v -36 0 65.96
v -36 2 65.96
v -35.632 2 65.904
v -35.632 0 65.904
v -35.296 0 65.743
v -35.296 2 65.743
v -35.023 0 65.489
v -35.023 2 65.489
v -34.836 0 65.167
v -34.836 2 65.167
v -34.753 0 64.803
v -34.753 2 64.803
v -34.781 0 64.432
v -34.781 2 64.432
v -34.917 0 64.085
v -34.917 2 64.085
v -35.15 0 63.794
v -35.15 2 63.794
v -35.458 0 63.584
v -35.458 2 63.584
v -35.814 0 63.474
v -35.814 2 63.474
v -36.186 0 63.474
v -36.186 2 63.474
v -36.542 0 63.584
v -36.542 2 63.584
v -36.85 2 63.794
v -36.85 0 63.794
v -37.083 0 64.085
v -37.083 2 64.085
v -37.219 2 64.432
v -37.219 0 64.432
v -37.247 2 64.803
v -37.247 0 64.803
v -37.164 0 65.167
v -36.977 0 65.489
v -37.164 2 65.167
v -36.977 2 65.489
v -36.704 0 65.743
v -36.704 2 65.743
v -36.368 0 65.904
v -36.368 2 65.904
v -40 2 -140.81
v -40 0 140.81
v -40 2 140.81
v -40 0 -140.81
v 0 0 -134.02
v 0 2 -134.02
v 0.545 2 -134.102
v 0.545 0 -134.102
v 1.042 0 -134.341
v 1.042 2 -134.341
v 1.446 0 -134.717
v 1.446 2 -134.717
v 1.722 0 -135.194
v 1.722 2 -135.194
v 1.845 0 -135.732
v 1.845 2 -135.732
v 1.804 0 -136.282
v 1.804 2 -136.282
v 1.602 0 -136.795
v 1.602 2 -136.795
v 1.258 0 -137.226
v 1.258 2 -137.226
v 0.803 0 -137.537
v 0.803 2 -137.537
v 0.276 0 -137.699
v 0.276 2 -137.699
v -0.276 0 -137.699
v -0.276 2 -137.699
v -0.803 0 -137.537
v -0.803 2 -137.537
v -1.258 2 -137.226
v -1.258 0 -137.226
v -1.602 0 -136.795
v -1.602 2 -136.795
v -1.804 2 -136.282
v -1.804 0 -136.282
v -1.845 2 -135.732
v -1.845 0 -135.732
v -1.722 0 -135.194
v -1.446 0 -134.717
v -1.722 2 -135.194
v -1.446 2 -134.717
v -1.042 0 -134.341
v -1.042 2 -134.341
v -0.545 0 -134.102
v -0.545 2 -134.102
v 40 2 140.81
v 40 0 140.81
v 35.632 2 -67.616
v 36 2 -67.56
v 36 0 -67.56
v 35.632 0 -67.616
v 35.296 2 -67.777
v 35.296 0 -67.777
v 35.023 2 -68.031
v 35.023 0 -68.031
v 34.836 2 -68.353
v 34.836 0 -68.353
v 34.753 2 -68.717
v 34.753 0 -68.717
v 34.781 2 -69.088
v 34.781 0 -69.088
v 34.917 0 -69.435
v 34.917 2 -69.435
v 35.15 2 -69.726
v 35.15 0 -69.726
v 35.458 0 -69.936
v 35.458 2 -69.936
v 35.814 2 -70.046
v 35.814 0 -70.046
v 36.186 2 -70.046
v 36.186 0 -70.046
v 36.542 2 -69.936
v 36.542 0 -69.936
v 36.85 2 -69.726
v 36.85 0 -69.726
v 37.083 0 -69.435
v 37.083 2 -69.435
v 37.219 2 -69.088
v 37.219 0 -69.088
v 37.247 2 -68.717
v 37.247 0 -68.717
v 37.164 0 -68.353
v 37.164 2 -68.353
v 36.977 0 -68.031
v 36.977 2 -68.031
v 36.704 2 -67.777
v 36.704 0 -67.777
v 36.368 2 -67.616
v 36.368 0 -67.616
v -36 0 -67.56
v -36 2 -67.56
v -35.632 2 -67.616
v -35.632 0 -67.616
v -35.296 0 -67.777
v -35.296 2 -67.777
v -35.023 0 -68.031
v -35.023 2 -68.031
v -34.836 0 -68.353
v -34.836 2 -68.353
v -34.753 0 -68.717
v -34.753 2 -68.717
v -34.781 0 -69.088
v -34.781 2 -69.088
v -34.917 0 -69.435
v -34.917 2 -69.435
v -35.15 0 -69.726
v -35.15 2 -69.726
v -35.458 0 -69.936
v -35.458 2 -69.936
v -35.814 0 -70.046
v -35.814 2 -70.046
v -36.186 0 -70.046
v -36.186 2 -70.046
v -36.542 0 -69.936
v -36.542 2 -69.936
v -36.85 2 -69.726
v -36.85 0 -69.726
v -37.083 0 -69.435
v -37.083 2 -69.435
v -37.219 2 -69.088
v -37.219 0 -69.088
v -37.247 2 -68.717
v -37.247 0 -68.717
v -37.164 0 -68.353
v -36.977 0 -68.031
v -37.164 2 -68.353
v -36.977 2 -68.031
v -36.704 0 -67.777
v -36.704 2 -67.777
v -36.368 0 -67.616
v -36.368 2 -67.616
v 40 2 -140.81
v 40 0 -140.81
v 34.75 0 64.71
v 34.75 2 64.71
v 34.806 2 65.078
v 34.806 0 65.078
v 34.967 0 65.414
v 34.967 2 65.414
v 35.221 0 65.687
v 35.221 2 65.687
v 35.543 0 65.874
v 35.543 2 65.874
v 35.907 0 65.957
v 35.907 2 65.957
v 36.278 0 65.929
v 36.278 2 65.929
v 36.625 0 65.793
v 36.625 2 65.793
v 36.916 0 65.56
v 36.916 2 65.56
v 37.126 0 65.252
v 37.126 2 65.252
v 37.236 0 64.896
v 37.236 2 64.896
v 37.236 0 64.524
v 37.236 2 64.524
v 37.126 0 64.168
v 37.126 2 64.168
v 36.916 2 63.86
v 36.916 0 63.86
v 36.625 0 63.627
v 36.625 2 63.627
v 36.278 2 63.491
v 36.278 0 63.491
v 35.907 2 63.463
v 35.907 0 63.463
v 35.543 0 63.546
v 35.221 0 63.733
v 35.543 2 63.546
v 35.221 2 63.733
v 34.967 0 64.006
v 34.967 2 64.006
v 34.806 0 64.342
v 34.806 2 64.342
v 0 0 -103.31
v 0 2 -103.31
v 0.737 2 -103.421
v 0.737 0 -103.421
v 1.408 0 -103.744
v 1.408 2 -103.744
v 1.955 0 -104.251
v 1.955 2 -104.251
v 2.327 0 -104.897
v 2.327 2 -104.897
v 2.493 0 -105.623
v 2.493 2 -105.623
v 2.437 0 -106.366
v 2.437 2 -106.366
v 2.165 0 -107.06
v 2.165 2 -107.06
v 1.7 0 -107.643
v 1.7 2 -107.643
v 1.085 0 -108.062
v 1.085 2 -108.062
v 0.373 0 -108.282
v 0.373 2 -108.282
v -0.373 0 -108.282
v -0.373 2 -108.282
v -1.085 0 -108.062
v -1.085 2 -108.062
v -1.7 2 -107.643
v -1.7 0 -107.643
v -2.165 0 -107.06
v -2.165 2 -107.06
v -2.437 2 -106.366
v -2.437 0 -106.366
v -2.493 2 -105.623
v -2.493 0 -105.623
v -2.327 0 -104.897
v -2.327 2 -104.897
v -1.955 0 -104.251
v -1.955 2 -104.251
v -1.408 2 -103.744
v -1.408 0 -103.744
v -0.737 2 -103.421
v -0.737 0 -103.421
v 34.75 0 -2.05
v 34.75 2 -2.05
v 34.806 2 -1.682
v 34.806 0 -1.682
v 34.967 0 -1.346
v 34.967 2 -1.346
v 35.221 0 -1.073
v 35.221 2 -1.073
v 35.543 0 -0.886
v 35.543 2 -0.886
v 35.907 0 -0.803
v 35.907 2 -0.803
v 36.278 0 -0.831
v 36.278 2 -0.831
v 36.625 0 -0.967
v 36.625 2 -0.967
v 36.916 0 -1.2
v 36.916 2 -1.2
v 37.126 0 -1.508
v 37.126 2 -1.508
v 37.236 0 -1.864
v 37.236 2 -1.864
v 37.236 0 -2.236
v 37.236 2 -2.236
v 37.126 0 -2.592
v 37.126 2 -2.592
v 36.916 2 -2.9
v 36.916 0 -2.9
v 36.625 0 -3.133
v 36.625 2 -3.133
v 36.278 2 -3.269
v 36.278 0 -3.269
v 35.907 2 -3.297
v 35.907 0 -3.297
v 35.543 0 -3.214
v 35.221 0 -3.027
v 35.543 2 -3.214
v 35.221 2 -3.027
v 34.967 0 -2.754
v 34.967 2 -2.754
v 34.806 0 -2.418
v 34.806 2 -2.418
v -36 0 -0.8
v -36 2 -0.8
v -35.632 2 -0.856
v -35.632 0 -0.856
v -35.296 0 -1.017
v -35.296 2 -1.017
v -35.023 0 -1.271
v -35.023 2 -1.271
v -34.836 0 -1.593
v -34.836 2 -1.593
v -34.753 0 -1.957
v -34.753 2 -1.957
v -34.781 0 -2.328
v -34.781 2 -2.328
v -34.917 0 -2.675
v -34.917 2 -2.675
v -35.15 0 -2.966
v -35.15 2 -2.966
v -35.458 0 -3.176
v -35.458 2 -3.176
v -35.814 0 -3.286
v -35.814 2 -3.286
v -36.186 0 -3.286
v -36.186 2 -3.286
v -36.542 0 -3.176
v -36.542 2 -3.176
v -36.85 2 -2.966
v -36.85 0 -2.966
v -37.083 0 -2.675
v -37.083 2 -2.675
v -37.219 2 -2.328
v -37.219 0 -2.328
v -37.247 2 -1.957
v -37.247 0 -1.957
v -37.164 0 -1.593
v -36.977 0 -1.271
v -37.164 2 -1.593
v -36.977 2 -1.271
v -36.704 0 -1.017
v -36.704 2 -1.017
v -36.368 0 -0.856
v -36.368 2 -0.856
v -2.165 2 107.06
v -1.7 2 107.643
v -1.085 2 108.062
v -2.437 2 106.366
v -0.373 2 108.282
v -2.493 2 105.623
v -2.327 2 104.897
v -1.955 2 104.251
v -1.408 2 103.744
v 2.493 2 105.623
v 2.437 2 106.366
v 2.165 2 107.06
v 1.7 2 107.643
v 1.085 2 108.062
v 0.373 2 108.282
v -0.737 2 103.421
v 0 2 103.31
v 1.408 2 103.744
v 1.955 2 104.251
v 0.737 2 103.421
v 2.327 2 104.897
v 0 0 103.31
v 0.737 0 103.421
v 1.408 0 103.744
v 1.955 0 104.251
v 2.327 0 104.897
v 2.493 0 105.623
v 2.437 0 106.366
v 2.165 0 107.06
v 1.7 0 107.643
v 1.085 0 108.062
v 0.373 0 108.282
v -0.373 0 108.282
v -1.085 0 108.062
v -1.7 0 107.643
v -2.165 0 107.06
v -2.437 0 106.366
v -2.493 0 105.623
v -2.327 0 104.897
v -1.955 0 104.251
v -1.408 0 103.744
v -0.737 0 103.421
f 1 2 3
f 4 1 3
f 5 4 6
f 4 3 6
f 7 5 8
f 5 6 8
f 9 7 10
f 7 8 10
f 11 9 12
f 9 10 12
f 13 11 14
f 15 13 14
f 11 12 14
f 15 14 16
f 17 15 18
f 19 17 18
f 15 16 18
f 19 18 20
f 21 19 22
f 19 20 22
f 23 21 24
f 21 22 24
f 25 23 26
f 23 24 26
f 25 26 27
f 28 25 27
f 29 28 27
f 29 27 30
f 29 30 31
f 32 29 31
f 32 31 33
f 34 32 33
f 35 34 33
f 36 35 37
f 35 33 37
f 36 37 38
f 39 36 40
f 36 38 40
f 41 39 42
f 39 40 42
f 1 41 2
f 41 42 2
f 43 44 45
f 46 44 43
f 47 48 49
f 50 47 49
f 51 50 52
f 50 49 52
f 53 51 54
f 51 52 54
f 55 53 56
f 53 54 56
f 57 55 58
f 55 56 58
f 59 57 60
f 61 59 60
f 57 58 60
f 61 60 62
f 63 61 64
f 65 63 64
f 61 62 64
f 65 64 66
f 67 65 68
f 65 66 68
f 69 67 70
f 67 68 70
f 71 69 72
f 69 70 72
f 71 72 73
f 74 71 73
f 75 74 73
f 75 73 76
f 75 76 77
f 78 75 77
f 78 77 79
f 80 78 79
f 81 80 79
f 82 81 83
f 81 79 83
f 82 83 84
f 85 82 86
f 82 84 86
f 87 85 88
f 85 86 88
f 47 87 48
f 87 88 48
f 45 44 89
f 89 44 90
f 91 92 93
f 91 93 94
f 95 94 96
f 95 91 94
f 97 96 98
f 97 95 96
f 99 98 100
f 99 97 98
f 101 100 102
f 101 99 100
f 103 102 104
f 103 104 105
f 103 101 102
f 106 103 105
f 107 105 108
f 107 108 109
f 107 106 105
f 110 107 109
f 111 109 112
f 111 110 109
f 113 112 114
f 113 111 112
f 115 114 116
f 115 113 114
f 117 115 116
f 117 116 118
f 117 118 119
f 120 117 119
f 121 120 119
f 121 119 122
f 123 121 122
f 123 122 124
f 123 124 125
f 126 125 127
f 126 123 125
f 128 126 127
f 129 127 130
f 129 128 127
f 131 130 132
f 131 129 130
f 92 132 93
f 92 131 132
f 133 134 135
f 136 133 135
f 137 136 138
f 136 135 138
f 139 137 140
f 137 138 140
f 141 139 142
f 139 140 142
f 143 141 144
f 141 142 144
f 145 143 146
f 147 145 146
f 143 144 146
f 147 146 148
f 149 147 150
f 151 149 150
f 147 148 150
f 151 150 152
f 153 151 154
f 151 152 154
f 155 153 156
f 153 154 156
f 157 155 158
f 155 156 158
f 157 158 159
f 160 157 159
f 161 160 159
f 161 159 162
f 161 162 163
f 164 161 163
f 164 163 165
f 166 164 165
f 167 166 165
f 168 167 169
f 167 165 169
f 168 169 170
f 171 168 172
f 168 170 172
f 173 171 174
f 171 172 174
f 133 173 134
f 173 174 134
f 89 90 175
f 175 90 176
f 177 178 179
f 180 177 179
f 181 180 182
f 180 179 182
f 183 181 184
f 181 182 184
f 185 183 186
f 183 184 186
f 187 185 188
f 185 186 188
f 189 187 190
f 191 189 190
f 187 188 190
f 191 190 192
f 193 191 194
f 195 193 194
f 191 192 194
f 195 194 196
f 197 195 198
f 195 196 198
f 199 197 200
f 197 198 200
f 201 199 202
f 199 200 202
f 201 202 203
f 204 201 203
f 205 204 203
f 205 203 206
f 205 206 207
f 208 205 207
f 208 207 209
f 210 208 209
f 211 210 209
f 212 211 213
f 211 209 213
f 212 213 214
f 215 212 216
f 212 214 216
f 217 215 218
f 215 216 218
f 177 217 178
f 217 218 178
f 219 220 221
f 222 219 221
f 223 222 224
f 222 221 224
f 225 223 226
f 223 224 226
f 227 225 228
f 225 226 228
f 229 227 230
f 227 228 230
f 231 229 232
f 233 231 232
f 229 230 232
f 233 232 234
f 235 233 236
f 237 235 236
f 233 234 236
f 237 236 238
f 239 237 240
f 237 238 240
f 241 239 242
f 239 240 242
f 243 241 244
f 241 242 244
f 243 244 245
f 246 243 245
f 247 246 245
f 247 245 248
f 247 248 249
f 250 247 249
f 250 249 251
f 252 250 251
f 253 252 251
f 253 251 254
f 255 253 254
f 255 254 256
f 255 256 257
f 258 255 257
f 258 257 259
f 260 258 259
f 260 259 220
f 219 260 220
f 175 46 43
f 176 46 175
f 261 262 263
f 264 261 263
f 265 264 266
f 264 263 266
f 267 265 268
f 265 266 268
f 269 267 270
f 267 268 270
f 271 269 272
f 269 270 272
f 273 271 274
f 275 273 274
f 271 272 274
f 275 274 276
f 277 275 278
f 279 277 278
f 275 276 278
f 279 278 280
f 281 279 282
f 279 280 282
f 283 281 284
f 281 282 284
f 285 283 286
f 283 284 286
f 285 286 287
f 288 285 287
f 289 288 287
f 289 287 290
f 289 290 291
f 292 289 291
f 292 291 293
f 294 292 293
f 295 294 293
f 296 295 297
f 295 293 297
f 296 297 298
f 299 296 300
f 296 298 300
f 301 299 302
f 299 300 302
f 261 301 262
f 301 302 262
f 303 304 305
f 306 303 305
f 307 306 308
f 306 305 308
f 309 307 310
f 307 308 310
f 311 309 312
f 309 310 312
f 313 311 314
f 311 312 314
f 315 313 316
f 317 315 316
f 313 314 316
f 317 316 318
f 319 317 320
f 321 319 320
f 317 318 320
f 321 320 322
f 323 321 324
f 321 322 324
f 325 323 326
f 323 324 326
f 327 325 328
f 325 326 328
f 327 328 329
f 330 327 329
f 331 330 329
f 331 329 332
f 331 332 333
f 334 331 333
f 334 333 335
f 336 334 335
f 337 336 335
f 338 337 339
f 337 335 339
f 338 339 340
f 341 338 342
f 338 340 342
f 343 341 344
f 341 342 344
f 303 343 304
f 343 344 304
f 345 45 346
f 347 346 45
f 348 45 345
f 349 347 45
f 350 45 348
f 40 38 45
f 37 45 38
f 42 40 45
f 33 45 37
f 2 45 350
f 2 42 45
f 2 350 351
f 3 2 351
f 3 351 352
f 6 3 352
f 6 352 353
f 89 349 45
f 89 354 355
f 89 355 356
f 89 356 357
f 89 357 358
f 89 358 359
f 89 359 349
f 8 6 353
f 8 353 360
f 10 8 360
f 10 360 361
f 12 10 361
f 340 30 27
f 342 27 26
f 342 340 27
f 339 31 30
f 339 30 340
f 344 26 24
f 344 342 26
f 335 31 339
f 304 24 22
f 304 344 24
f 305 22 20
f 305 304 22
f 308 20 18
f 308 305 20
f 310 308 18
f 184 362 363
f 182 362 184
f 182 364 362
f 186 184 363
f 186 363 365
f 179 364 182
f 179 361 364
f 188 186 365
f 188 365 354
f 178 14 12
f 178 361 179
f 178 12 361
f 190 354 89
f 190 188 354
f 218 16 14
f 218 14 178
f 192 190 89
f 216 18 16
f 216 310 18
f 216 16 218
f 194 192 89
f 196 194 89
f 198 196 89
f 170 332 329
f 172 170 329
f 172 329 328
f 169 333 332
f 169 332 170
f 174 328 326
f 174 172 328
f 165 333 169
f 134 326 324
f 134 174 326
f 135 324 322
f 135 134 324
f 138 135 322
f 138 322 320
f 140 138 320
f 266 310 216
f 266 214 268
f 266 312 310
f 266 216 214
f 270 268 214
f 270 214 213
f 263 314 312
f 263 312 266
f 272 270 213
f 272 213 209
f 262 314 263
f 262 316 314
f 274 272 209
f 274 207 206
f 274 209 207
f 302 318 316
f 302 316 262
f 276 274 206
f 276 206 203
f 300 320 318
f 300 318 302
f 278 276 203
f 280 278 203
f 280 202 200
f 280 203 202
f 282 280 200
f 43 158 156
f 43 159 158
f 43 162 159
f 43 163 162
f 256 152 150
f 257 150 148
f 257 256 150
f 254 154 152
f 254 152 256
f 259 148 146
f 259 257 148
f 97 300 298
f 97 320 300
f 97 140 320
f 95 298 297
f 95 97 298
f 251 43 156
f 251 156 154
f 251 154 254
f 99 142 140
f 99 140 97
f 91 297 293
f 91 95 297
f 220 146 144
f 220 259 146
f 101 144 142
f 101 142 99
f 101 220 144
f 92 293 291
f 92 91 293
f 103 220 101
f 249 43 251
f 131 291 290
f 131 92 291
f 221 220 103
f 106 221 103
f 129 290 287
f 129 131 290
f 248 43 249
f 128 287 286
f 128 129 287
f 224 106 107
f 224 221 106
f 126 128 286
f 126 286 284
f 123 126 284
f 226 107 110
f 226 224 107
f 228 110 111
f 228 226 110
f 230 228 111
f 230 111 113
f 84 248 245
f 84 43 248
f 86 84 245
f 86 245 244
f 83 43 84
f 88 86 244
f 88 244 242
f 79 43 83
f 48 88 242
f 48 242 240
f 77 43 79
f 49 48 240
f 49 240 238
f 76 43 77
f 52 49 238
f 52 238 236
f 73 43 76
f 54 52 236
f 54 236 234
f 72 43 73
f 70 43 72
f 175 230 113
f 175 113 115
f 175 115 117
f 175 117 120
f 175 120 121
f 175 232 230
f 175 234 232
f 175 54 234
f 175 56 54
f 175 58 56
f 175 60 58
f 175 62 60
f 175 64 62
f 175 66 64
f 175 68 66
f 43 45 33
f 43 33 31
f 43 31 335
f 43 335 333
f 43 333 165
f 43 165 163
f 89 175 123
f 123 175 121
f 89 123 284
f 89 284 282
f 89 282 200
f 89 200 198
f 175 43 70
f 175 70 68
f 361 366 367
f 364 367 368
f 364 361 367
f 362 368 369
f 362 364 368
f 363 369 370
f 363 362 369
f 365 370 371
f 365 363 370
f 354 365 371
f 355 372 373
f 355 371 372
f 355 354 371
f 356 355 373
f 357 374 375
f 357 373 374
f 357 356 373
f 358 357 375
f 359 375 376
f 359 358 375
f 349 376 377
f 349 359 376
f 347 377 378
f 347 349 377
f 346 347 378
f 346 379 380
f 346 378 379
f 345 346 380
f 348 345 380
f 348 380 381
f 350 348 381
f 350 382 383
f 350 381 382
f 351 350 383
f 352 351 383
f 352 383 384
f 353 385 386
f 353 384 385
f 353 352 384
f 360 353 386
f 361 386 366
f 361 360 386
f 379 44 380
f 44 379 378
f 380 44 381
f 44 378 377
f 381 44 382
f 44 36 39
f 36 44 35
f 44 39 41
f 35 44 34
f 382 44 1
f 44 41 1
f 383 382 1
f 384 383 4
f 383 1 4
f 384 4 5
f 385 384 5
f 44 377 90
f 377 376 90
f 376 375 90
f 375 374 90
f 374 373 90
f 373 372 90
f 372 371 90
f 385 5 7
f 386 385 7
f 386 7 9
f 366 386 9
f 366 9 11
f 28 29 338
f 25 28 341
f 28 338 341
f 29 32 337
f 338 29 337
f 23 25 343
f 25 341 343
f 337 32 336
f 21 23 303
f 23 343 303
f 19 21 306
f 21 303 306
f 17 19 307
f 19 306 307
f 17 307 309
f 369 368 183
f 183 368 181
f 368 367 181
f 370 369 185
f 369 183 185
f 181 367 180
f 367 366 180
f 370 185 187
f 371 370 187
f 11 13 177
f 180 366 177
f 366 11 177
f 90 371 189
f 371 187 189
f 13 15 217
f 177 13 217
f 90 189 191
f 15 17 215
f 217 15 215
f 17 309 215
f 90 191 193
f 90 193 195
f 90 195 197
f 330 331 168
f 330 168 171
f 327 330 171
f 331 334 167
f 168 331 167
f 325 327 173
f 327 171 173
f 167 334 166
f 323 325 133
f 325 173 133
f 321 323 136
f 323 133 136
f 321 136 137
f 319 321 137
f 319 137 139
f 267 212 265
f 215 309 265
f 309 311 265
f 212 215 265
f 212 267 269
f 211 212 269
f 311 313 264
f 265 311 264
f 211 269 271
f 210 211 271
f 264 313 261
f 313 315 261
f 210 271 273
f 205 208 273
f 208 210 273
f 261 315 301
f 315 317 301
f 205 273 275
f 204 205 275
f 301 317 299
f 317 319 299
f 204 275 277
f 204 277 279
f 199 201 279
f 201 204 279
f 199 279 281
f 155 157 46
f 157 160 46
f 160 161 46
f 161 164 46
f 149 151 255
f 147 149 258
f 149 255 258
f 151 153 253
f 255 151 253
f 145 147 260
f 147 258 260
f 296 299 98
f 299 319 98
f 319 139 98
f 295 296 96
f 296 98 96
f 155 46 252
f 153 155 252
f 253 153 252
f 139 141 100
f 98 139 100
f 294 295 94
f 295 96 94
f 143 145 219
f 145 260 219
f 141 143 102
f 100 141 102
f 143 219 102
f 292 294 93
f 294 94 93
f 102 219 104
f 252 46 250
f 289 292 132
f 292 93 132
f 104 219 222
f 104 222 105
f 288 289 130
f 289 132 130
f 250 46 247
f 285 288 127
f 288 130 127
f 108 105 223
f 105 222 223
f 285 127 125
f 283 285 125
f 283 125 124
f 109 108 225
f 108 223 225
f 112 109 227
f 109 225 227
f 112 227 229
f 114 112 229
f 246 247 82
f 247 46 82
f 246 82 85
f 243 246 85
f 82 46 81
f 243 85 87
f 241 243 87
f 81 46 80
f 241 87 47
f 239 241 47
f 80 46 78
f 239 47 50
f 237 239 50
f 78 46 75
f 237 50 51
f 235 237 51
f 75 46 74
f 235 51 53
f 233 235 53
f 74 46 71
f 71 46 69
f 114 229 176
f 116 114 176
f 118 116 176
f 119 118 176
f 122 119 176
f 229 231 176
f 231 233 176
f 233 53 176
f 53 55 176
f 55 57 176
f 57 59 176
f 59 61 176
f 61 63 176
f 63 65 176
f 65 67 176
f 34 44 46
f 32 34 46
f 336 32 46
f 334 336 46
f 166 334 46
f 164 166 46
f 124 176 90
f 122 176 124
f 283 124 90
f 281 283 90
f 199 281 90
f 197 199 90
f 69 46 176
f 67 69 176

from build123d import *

# Parameters (mm, degrees)
SKETCH1_W               = 80
SKETCH1_H               = 281.62
BOSS_EXTRUDE1_DEPTH     = 2
SKETCH2_R               = 1.85
CUT_EXTRUDE1_DEPTH      = 2
SKETCH3_R               = 1.25
CUT_EXTRUDE2_DEPTH      = 2
LPATTERN1_COUNT         = 3
LPATTERN1_PITCH         = 66.76
MIRROR1_COPY_1_SKETCH_R = 1.25
MIRROR1_COPY_1_DEPTH    = 2
MIRROR1_COPY_2_SKETCH_R = 1.25
MIRROR1_COPY_2_DEPTH    = 2
SKETCH4_R               = 2.5
CUT_EXTRUDE3_DEPTH      = 10


with BuildPart() as part:
    # Sketch1 → Boss-Extrude1 (new body)
    with BuildSketch(Plane(origin=(0, 0, 0), x_dir=(1, 0, 0), z_dir=(0, 1, 0))):
        Rectangle(SKETCH1_W, SKETCH1_H)
    extrude(amount=BOSS_EXTRUDE1_DEPTH)

    # Sketch2 → Cut-Extrude1 (cut)
    with BuildSketch(Plane(origin=(0, 2, 0), x_dir=(1, 0, 0), z_dir=(0, 1, 0))):
        with Locations(Location((0, 135.87, 0), (0, 0, 270))):
            Circle(SKETCH2_R)
    extrude(amount=-CUT_EXTRUDE1_DEPTH, mode=Mode.SUBTRACT)

    # Sketch3 → Cut-Extrude2 (cut)
    with BuildSketch(Plane(origin=(0, 2, 0), x_dir=(1, 0, 0), z_dir=(0, 1, 0))):
        with Locations(Location((-36, 68.81, 0), (0, 0, 270))):
            Circle(SKETCH3_R)
    cut_extrude2 = extrude(amount=-CUT_EXTRUDE2_DEPTH, mode=Mode.SUBTRACT)

    # LPattern1: Cut-Extrude2 ×3
    with Locations(*[(0, 0, i * LPATTERN1_PITCH) for i in range(1, LPATTERN1_COUNT)]):
        add(cut_extrude2, mode=Mode.SUBTRACT)

    # Mirror1: Cut-Extrude2 across plane
    add(cut_extrude2.mirror(Plane(origin=(0, 0, 0), x_dir=(0, 0, 1), z_dir=(1, 0, 0))), mode=Mode.SUBTRACT)

    # Mirror1 copy 1 sketch → Mirror1 copy 1 (cut)
    with BuildSketch(Plane(origin=(0, 2, 66.76), x_dir=(-1, 0, 0), z_dir=(0, 1, 0))):
        with Locations((-36, -68.81)):
            Circle(MIRROR1_COPY_1_SKETCH_R)
    extrude(amount=-MIRROR1_COPY_1_DEPTH, mode=Mode.SUBTRACT)

    # Mirror1 copy 2 sketch → Mirror1 copy 2 (cut)
    with BuildSketch(Plane(origin=(0, 2, 133.52), x_dir=(-1, 0, 0), z_dir=(0, 1, 0))):
        with Locations((-36, -68.81)):
            Circle(MIRROR1_COPY_2_SKETCH_R)
    extrude(amount=-MIRROR1_COPY_2_DEPTH, mode=Mode.SUBTRACT)

    # Sketch4 → Cut-Extrude3 (cut)
    with BuildSketch(Plane(origin=(0, 2, 0), x_dir=(1, 0, 0), z_dir=(0, 1, 0))):
        with Locations(Location((0, 105.81, 0), (0, 0, 270))):
            Circle(SKETCH4_R)
    cut_extrude3 = extrude(amount=-CUT_EXTRUDE3_DEPTH, mode=Mode.SUBTRACT)

    # Mirror2: Cut-Extrude3 across plane
    add(cut_extrude3.mirror(Plane.XY), mode=Mode.SUBTRACT)


solid = part.part
